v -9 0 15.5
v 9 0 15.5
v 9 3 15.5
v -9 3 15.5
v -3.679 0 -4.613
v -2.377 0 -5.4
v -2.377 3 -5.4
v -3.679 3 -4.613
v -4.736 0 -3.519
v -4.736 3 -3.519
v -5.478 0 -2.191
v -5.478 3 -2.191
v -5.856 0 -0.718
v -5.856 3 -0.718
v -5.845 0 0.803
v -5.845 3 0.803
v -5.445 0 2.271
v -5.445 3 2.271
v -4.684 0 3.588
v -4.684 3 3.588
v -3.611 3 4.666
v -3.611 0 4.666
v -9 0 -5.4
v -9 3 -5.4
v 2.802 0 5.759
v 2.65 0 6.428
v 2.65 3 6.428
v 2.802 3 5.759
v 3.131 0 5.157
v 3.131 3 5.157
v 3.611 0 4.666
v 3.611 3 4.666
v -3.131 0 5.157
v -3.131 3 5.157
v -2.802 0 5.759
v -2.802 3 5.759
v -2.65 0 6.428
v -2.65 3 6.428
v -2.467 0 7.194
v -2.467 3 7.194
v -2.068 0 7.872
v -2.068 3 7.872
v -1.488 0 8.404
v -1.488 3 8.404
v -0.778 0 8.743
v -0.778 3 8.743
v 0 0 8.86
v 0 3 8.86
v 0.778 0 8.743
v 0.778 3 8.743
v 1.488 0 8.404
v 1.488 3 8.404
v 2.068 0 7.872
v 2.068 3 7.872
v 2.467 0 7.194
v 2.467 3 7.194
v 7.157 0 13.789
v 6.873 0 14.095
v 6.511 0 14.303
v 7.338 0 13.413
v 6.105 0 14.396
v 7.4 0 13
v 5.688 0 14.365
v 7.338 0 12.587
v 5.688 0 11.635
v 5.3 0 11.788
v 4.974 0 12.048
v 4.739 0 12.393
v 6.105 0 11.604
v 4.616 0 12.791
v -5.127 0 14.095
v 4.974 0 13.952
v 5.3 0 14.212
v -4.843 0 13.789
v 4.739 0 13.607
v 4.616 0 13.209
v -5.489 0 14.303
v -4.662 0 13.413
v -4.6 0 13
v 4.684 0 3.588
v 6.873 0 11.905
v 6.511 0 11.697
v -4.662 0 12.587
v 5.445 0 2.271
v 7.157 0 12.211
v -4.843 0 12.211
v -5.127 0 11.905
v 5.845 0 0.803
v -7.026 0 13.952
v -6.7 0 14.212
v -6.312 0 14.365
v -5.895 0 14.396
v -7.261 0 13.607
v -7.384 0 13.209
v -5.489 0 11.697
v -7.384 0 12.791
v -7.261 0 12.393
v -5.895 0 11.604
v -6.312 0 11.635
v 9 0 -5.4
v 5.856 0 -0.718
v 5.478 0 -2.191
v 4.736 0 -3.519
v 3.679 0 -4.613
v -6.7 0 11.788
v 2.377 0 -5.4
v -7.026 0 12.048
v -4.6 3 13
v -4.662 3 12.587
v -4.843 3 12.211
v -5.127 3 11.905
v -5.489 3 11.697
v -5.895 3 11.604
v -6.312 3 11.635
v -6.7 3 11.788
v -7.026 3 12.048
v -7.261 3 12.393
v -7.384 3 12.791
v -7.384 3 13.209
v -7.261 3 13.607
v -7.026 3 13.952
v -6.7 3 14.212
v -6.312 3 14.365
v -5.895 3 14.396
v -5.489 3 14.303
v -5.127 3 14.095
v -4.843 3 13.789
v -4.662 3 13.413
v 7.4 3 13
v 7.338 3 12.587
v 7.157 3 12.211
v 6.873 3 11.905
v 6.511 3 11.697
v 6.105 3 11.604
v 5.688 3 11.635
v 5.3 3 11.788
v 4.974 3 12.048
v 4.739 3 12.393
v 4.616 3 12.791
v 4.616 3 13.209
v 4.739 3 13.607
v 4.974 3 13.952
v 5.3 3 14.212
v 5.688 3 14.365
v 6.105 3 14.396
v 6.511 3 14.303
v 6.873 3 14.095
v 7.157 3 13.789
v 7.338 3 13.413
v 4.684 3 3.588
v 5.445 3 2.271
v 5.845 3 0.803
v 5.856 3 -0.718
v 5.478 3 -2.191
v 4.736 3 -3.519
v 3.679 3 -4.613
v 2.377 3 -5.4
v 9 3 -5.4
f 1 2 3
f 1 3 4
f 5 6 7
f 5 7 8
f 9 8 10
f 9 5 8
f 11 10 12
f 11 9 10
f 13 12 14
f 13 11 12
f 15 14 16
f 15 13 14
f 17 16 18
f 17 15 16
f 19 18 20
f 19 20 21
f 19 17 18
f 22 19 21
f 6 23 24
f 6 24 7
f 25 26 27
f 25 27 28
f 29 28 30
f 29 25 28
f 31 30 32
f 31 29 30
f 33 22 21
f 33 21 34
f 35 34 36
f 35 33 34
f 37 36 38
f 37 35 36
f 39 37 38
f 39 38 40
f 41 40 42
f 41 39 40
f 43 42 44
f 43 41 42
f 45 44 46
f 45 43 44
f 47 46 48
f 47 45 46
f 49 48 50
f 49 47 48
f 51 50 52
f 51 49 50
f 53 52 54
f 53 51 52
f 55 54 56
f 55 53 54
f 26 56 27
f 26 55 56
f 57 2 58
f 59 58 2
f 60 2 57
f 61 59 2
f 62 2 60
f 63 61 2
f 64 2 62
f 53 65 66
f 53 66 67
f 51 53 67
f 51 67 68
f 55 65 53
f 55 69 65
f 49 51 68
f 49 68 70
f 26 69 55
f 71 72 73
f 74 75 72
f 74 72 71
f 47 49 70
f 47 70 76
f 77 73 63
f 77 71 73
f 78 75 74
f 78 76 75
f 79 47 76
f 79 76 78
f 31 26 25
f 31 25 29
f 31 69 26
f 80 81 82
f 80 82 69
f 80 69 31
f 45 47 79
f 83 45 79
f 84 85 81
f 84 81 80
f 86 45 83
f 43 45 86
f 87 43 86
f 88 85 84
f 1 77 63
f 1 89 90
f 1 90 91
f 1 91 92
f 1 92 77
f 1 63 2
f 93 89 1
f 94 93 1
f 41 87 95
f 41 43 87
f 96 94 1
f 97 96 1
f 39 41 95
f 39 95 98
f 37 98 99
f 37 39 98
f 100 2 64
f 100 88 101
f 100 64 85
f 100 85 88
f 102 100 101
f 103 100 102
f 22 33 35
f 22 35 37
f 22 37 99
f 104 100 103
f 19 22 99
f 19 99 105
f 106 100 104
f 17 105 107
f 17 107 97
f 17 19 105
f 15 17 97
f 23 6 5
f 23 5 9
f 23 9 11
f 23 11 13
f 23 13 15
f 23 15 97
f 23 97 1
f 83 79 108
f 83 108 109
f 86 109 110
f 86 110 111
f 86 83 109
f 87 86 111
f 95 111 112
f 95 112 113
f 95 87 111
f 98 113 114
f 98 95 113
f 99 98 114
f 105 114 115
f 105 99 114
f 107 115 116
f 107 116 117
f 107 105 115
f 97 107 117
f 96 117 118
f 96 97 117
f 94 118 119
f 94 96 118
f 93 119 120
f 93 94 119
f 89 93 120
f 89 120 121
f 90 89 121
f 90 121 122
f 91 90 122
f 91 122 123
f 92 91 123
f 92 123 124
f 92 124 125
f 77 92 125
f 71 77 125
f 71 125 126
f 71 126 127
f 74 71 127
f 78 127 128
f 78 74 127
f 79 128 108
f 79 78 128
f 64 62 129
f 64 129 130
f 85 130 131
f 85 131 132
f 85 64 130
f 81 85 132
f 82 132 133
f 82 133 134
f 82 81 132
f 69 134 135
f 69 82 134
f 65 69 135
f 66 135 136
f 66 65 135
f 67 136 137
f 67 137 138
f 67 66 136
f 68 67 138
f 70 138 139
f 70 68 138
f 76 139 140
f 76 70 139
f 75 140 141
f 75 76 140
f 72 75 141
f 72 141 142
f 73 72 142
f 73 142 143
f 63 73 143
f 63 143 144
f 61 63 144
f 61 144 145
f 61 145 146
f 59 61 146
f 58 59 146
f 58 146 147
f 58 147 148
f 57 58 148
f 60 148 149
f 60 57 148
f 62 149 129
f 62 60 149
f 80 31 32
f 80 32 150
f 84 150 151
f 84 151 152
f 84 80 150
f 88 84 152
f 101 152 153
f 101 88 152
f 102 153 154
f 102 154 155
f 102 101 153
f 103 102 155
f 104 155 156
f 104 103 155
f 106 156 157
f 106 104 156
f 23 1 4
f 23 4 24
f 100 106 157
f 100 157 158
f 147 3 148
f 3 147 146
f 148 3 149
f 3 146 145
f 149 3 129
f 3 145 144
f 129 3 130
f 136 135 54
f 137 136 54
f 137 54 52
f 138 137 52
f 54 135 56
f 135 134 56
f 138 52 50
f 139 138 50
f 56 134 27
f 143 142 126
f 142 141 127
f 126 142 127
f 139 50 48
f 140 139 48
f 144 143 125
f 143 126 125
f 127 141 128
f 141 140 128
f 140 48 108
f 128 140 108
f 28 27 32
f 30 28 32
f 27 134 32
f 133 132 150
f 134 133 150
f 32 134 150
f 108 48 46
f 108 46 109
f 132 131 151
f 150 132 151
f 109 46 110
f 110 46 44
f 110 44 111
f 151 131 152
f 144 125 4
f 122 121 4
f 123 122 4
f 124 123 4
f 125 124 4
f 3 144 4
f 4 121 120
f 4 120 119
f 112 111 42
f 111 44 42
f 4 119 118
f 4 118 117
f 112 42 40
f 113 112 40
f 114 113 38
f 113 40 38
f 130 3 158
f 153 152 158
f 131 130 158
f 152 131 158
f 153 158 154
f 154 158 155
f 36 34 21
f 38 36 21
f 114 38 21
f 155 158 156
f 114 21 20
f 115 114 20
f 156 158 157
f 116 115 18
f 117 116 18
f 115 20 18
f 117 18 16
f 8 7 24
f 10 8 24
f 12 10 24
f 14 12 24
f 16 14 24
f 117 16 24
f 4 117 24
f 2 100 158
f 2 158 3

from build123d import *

# Parameters (mm, degrees)
CROQUIS1_R              = 1.4
SALIENTE_EXTRUIR1_DEPTH = 3


with BuildPart() as part:
    # Croquis1 → Saliente-Extruir1 (new body)
    with BuildSketch(Plane(origin=(0, 0, 0), x_dir=(1, 0, 0), z_dir=(0, 1, 0))):
        with BuildLine():
            Line((2.376972865, 5.4), (9, 5.4))
            Line((9, 5.4), (9, -15.5))
            Line((9, -15.5), (-9, -15.5))
            Line((-9, -15.5), (-9, 5.4))
            Line((-9, 5.4), (-2.376972865, 5.4))
            ThreePointArc((-2.376972865, 5.4), (-5.856174249, 0.717790472), (-3.610771276, -4.666083025))
            ThreePointArc((-3.610771276, -4.666083025), (-2.945738566, -5.446622945), (-2.65, -6.428483309))
            ThreePointArc((-2.65, -6.428483309), (0, -8.859831691), (2.65, -6.428483309))
            ThreePointArc((2.65, -6.428483309), (2.945738566, -5.446622945), (3.610771276, -4.666083025))
            ThreePointArc((3.610771276, -4.666083025), (5.856174249, 0.717790472), (2.376972865, 5.4))
        make_face()
        with Locations((-6, -13)):
            Circle(CROQUIS1_R, mode=Mode.SUBTRACT)
        with Locations((6, -13)):
            Circle(CROQUIS1_R, mode=Mode.SUBTRACT)
    extrude(amount=SALIENTE_EXTRUIR1_DEPTH)


solid = part.part
